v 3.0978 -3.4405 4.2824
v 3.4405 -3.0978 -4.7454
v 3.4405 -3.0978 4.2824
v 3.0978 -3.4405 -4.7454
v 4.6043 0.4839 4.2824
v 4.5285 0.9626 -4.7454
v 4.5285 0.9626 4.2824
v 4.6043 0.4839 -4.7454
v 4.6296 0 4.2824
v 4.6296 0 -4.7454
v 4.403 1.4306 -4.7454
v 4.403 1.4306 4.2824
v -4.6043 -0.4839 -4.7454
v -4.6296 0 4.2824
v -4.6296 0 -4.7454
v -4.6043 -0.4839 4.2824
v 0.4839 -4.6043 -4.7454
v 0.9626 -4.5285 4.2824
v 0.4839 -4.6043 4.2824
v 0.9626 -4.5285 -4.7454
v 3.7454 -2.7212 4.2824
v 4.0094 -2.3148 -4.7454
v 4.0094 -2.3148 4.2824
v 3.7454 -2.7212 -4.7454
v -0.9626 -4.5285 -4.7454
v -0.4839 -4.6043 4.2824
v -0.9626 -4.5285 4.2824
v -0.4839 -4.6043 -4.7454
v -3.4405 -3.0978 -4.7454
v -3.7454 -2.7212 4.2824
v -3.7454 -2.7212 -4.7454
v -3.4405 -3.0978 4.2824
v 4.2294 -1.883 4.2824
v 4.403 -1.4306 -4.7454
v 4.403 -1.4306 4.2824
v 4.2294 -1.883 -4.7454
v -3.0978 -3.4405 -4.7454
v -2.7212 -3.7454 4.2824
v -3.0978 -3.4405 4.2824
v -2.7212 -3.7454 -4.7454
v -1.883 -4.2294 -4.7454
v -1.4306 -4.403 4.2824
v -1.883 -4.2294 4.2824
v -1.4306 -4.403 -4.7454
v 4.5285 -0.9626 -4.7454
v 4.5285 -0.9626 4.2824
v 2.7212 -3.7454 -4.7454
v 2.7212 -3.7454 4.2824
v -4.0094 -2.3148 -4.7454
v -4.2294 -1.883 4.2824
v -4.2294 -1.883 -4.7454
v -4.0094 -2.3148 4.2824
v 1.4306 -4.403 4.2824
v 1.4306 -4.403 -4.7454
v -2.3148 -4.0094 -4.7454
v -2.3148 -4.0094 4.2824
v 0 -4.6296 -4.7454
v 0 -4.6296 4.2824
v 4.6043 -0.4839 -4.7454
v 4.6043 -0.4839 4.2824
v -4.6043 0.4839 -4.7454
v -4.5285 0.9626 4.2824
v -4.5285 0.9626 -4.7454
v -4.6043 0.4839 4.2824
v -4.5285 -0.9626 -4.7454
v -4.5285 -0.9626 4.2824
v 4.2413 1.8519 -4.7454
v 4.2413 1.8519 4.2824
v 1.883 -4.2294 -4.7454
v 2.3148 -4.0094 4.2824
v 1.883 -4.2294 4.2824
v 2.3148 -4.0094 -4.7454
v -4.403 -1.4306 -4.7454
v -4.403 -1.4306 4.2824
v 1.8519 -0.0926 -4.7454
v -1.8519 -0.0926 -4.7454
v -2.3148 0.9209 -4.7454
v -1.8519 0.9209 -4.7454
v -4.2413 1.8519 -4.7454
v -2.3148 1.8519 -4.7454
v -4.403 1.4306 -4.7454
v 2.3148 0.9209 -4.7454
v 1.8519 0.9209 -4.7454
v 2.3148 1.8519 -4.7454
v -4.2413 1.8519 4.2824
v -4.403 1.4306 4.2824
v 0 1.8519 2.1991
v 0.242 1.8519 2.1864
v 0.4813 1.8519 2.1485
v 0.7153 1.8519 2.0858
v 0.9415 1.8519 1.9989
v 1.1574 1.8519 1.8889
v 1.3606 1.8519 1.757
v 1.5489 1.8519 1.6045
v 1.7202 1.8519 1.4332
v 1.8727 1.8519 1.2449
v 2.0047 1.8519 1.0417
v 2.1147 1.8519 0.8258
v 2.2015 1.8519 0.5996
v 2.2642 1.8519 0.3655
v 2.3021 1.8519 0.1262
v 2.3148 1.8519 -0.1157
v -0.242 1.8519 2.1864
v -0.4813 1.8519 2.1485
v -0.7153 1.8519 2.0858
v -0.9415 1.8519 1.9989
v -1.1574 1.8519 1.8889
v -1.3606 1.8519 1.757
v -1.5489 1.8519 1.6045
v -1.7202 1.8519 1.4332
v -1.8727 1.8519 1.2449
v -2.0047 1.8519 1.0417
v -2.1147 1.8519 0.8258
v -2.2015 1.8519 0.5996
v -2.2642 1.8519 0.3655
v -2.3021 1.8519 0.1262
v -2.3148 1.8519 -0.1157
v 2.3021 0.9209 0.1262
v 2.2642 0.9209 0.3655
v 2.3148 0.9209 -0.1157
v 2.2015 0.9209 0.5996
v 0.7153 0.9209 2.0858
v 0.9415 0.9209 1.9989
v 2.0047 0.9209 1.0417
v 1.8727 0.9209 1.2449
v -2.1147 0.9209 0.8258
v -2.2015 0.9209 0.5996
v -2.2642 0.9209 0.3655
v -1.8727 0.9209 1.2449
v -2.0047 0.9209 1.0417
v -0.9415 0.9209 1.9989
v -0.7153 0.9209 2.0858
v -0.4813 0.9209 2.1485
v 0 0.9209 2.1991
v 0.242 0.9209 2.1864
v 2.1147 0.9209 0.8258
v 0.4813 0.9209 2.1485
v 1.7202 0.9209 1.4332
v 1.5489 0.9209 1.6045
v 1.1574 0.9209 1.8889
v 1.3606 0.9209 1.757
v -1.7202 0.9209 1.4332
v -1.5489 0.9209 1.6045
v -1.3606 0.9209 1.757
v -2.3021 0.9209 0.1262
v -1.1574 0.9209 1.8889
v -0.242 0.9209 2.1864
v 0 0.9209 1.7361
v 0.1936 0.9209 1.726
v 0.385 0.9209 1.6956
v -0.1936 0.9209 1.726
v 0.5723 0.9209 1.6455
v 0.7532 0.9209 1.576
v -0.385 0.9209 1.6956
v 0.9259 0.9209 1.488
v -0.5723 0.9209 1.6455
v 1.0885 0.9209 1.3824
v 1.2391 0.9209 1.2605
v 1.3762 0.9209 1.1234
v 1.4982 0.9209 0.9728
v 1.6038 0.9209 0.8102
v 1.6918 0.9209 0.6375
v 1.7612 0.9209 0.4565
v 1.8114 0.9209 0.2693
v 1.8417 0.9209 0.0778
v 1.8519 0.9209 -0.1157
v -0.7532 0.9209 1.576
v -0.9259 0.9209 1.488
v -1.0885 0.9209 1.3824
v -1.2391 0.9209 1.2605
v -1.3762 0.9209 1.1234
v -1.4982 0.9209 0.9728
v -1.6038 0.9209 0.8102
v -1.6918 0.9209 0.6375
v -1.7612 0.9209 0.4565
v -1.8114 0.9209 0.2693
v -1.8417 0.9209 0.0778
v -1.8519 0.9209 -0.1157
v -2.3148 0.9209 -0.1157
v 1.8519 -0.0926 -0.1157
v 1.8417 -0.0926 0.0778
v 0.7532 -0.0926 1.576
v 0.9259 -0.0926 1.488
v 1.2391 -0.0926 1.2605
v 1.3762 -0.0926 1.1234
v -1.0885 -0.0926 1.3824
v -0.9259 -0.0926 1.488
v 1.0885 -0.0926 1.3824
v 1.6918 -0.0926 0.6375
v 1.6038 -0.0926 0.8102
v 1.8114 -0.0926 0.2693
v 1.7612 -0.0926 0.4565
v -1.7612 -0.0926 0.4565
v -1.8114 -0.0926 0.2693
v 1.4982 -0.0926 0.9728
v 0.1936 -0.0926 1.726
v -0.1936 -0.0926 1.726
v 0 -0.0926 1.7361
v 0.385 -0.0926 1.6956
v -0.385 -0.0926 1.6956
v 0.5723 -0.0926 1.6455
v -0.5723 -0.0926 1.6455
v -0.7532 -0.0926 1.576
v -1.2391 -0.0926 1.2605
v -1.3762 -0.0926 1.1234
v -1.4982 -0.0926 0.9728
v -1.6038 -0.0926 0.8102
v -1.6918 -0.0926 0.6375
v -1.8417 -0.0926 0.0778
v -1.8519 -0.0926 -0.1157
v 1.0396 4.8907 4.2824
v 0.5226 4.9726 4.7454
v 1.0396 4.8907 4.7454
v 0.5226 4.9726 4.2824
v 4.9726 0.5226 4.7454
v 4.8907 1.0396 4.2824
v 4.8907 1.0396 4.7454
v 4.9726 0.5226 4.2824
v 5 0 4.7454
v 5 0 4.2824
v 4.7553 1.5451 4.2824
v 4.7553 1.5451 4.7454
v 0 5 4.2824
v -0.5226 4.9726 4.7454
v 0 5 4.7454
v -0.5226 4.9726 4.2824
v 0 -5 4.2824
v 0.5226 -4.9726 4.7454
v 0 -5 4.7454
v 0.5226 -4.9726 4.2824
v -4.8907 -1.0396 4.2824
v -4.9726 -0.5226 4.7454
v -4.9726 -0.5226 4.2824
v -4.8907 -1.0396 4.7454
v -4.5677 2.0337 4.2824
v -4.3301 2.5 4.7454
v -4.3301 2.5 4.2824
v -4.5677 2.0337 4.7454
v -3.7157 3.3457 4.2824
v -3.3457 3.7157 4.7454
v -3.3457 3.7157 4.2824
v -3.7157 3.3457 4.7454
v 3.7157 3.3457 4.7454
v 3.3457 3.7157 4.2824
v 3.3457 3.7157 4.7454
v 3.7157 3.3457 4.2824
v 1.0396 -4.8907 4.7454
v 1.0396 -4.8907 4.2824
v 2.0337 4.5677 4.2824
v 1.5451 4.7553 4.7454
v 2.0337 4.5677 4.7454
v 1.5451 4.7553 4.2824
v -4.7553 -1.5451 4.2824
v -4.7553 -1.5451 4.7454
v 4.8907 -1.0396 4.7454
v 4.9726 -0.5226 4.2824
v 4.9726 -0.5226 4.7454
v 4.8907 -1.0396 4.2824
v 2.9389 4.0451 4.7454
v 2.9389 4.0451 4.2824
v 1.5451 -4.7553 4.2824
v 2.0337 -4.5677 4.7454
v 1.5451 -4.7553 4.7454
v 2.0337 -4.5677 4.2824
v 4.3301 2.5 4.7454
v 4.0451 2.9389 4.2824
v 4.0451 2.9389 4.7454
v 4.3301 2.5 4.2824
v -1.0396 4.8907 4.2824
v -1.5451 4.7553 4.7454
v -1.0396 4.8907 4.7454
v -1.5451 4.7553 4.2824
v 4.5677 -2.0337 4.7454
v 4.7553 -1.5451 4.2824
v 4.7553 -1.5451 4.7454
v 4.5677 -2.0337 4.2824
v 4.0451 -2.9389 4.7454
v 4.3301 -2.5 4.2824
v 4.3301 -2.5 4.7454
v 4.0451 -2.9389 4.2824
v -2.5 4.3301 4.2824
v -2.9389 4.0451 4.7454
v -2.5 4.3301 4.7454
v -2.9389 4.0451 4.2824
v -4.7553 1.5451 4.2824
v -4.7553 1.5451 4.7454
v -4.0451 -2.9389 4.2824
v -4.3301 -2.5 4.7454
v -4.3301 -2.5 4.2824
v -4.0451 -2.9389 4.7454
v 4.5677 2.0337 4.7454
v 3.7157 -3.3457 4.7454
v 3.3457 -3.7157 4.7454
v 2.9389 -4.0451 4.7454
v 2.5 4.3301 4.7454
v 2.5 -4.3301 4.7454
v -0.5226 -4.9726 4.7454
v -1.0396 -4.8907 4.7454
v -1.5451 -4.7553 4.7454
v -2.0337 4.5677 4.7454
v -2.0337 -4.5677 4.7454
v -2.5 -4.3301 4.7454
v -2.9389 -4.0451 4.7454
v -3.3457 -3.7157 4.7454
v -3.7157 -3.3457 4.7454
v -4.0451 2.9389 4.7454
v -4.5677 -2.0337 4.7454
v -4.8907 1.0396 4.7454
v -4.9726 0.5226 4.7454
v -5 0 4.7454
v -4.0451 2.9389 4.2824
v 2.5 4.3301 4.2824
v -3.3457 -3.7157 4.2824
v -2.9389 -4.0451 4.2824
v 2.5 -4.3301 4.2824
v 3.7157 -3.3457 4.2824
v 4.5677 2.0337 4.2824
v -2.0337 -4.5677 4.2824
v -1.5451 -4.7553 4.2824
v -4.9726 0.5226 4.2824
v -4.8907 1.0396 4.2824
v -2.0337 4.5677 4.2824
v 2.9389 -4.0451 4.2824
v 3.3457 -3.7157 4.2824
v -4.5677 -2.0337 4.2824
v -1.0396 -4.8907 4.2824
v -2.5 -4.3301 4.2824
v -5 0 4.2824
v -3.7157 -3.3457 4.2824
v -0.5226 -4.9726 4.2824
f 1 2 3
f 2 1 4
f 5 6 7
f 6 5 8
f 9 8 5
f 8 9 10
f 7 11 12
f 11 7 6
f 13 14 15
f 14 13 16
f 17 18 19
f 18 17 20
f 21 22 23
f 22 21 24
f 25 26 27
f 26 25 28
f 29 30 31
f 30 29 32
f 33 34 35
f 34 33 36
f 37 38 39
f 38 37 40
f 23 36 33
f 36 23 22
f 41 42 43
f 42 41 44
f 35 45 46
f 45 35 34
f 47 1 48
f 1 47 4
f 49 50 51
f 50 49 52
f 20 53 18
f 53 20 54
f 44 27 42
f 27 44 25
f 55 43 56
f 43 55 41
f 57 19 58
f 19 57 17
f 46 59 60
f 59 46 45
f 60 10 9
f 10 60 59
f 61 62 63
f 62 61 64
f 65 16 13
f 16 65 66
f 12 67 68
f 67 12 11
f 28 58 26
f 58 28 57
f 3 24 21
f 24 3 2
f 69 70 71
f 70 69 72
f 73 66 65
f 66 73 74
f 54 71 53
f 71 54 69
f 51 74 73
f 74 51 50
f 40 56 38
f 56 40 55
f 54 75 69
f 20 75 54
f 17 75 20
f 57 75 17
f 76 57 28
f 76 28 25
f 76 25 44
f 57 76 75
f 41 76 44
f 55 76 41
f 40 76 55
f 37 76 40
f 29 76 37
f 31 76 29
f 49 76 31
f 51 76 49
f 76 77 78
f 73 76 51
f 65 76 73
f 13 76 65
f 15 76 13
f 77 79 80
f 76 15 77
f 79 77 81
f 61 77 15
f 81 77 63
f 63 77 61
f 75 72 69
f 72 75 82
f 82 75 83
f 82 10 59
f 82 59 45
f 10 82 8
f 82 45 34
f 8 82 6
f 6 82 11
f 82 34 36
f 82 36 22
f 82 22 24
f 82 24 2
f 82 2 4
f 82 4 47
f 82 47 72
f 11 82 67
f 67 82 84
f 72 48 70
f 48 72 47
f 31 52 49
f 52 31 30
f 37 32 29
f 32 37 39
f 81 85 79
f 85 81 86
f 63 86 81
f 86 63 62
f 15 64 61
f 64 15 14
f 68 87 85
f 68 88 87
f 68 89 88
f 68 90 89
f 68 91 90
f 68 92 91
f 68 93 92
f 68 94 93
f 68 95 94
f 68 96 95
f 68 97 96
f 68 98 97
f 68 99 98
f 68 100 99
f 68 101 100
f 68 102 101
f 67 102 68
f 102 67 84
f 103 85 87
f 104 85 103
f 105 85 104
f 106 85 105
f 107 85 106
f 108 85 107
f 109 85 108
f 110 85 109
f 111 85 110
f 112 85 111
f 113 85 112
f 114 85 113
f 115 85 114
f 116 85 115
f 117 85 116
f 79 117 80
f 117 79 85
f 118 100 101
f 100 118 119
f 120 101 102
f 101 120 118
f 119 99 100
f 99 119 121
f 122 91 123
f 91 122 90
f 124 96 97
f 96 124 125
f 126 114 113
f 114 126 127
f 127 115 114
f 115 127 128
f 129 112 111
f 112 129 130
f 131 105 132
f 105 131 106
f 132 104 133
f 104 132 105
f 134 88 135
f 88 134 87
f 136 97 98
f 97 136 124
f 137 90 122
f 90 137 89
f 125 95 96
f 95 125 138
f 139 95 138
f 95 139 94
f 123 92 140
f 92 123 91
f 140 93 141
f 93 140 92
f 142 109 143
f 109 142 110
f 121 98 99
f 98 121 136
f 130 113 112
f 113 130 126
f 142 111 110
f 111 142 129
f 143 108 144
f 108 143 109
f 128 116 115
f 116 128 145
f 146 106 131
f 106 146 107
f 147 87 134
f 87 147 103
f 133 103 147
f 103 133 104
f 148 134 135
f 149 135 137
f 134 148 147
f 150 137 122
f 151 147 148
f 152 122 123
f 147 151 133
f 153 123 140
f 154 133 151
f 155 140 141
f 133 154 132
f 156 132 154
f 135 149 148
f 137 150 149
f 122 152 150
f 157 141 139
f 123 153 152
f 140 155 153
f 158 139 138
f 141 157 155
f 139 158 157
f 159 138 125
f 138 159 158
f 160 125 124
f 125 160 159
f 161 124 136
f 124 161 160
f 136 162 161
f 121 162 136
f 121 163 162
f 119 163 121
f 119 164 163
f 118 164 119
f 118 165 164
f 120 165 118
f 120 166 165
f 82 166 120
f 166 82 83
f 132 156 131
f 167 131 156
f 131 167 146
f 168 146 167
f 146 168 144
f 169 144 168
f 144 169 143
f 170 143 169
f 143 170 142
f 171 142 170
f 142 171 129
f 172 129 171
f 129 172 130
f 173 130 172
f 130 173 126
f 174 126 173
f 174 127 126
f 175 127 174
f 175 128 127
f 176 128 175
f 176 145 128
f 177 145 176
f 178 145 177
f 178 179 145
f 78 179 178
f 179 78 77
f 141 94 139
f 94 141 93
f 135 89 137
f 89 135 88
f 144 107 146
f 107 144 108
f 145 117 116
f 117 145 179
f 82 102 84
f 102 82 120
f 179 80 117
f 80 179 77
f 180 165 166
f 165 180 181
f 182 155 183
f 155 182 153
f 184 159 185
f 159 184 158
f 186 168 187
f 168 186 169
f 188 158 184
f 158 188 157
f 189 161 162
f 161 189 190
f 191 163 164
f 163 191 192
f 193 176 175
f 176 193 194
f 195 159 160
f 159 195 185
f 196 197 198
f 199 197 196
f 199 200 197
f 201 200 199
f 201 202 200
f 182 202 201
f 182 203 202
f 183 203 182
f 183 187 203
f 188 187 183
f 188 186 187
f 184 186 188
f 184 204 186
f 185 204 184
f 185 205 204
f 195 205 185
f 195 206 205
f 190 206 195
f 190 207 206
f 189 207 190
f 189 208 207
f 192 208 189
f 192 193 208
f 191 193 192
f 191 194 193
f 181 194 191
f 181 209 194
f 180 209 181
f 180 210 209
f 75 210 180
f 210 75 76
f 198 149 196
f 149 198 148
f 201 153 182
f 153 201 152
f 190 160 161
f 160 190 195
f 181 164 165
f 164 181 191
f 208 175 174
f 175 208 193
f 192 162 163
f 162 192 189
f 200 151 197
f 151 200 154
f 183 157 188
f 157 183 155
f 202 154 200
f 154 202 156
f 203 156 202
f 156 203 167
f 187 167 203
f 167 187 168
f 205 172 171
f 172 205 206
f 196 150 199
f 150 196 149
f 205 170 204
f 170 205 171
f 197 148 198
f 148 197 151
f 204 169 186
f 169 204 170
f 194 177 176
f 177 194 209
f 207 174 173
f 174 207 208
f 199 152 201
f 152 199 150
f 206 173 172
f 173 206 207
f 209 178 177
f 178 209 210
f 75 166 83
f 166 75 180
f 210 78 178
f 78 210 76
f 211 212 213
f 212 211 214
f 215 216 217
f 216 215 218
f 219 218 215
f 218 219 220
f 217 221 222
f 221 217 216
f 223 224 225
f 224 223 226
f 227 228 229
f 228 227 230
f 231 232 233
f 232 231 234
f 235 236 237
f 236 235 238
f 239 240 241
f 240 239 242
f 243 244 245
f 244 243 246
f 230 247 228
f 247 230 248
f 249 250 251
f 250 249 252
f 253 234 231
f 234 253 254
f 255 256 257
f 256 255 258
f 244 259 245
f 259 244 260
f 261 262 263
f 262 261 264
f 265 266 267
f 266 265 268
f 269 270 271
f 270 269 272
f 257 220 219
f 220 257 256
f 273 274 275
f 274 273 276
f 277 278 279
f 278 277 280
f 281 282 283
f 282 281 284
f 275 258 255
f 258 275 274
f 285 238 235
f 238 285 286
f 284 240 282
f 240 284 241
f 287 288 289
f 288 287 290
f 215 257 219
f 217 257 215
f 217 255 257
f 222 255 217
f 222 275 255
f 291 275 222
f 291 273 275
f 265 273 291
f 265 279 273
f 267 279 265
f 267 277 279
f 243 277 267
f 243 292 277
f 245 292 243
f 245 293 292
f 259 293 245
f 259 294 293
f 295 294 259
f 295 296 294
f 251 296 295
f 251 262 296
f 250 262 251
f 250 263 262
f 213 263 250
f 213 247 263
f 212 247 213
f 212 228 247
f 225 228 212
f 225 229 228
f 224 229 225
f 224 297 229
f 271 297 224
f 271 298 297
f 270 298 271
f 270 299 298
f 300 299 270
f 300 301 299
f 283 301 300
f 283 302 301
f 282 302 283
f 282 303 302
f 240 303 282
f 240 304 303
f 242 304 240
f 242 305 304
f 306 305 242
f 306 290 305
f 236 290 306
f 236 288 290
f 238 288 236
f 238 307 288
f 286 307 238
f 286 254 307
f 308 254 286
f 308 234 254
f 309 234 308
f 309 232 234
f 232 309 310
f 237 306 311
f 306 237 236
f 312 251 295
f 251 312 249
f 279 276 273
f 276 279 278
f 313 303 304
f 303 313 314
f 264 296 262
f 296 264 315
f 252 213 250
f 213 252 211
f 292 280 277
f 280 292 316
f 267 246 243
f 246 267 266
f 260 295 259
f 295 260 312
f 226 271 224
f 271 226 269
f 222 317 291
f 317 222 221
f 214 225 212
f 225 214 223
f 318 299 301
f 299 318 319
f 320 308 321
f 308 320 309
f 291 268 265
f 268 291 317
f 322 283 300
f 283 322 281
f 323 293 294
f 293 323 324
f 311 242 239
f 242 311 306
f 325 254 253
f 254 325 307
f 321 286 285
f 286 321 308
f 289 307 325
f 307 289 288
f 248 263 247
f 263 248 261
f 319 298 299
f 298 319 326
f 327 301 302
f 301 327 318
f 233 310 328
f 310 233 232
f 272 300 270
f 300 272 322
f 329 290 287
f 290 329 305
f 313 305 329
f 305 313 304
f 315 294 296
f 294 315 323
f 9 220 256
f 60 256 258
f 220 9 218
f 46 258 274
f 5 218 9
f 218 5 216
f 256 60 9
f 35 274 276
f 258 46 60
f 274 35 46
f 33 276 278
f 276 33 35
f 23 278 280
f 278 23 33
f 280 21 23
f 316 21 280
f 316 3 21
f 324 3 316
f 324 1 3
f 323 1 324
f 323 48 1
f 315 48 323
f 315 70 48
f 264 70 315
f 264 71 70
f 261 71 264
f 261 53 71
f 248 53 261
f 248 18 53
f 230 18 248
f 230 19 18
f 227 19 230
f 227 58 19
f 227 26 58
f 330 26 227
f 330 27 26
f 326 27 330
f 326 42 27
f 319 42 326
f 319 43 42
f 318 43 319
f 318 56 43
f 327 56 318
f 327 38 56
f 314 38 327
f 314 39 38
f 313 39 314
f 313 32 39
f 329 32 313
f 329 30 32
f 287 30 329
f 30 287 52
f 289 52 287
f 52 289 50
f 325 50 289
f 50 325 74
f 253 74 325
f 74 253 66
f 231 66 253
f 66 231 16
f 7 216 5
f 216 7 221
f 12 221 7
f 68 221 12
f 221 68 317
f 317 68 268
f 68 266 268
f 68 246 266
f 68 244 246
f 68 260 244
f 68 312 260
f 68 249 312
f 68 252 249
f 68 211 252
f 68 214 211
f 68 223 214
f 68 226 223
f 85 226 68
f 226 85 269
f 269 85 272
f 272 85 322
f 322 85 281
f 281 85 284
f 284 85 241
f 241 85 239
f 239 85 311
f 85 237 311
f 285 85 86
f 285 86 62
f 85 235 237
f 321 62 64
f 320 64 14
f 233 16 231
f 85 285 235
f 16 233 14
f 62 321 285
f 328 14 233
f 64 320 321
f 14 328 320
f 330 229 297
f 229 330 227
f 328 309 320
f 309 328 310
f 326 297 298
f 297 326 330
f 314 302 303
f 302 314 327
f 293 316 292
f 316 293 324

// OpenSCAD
translate([-0.000000, -0.000000, 4.513889])
union() {
  cylinder(h = 0.462963, r1 = 5.000000, r2 = 5.000000, center = true, $fn = 60);
  translate([0.000000, 0.000000, -4.629630])
  difference() {
    intersection() {
      cylinder(h = 9.259259, r1 = 4.629630, r2 = 4.629630, center = true, $fn = 60);
      translate([0.000000, -2.777778, 0.000000])
      cube(size = [9.259259, 9.259259, 9.259259], center = true);
    }
    translate([0.000000, 1.388889, -2.314815])
    union() {
      // Door 1.
      union() {
        translate([0.000000, 0.000000, 2.314815])
        rotate([90, 0, 0])
        cylinder(h = 0.935926, r1 = 2.314815, r2 = 2.314815, center = true, $fn = 60);
        cube(size = [4.629630, 0.935926, 4.629630], center = true);
      }
      // Door 2.
      translate([0.000000, -0.555556, 0.000000])
      union() {
        translate([0.000000, 0.000000, 2.314815])
        rotate([90, 0, 0])
        cylinder(h = 1.851852, r1 = 1.851852, r2 = 1.851852, center = true, $fn = 60);
        cube(size = [3.703704, 1.851852, 4.629630], center = true);
      }
    }
  }
}
